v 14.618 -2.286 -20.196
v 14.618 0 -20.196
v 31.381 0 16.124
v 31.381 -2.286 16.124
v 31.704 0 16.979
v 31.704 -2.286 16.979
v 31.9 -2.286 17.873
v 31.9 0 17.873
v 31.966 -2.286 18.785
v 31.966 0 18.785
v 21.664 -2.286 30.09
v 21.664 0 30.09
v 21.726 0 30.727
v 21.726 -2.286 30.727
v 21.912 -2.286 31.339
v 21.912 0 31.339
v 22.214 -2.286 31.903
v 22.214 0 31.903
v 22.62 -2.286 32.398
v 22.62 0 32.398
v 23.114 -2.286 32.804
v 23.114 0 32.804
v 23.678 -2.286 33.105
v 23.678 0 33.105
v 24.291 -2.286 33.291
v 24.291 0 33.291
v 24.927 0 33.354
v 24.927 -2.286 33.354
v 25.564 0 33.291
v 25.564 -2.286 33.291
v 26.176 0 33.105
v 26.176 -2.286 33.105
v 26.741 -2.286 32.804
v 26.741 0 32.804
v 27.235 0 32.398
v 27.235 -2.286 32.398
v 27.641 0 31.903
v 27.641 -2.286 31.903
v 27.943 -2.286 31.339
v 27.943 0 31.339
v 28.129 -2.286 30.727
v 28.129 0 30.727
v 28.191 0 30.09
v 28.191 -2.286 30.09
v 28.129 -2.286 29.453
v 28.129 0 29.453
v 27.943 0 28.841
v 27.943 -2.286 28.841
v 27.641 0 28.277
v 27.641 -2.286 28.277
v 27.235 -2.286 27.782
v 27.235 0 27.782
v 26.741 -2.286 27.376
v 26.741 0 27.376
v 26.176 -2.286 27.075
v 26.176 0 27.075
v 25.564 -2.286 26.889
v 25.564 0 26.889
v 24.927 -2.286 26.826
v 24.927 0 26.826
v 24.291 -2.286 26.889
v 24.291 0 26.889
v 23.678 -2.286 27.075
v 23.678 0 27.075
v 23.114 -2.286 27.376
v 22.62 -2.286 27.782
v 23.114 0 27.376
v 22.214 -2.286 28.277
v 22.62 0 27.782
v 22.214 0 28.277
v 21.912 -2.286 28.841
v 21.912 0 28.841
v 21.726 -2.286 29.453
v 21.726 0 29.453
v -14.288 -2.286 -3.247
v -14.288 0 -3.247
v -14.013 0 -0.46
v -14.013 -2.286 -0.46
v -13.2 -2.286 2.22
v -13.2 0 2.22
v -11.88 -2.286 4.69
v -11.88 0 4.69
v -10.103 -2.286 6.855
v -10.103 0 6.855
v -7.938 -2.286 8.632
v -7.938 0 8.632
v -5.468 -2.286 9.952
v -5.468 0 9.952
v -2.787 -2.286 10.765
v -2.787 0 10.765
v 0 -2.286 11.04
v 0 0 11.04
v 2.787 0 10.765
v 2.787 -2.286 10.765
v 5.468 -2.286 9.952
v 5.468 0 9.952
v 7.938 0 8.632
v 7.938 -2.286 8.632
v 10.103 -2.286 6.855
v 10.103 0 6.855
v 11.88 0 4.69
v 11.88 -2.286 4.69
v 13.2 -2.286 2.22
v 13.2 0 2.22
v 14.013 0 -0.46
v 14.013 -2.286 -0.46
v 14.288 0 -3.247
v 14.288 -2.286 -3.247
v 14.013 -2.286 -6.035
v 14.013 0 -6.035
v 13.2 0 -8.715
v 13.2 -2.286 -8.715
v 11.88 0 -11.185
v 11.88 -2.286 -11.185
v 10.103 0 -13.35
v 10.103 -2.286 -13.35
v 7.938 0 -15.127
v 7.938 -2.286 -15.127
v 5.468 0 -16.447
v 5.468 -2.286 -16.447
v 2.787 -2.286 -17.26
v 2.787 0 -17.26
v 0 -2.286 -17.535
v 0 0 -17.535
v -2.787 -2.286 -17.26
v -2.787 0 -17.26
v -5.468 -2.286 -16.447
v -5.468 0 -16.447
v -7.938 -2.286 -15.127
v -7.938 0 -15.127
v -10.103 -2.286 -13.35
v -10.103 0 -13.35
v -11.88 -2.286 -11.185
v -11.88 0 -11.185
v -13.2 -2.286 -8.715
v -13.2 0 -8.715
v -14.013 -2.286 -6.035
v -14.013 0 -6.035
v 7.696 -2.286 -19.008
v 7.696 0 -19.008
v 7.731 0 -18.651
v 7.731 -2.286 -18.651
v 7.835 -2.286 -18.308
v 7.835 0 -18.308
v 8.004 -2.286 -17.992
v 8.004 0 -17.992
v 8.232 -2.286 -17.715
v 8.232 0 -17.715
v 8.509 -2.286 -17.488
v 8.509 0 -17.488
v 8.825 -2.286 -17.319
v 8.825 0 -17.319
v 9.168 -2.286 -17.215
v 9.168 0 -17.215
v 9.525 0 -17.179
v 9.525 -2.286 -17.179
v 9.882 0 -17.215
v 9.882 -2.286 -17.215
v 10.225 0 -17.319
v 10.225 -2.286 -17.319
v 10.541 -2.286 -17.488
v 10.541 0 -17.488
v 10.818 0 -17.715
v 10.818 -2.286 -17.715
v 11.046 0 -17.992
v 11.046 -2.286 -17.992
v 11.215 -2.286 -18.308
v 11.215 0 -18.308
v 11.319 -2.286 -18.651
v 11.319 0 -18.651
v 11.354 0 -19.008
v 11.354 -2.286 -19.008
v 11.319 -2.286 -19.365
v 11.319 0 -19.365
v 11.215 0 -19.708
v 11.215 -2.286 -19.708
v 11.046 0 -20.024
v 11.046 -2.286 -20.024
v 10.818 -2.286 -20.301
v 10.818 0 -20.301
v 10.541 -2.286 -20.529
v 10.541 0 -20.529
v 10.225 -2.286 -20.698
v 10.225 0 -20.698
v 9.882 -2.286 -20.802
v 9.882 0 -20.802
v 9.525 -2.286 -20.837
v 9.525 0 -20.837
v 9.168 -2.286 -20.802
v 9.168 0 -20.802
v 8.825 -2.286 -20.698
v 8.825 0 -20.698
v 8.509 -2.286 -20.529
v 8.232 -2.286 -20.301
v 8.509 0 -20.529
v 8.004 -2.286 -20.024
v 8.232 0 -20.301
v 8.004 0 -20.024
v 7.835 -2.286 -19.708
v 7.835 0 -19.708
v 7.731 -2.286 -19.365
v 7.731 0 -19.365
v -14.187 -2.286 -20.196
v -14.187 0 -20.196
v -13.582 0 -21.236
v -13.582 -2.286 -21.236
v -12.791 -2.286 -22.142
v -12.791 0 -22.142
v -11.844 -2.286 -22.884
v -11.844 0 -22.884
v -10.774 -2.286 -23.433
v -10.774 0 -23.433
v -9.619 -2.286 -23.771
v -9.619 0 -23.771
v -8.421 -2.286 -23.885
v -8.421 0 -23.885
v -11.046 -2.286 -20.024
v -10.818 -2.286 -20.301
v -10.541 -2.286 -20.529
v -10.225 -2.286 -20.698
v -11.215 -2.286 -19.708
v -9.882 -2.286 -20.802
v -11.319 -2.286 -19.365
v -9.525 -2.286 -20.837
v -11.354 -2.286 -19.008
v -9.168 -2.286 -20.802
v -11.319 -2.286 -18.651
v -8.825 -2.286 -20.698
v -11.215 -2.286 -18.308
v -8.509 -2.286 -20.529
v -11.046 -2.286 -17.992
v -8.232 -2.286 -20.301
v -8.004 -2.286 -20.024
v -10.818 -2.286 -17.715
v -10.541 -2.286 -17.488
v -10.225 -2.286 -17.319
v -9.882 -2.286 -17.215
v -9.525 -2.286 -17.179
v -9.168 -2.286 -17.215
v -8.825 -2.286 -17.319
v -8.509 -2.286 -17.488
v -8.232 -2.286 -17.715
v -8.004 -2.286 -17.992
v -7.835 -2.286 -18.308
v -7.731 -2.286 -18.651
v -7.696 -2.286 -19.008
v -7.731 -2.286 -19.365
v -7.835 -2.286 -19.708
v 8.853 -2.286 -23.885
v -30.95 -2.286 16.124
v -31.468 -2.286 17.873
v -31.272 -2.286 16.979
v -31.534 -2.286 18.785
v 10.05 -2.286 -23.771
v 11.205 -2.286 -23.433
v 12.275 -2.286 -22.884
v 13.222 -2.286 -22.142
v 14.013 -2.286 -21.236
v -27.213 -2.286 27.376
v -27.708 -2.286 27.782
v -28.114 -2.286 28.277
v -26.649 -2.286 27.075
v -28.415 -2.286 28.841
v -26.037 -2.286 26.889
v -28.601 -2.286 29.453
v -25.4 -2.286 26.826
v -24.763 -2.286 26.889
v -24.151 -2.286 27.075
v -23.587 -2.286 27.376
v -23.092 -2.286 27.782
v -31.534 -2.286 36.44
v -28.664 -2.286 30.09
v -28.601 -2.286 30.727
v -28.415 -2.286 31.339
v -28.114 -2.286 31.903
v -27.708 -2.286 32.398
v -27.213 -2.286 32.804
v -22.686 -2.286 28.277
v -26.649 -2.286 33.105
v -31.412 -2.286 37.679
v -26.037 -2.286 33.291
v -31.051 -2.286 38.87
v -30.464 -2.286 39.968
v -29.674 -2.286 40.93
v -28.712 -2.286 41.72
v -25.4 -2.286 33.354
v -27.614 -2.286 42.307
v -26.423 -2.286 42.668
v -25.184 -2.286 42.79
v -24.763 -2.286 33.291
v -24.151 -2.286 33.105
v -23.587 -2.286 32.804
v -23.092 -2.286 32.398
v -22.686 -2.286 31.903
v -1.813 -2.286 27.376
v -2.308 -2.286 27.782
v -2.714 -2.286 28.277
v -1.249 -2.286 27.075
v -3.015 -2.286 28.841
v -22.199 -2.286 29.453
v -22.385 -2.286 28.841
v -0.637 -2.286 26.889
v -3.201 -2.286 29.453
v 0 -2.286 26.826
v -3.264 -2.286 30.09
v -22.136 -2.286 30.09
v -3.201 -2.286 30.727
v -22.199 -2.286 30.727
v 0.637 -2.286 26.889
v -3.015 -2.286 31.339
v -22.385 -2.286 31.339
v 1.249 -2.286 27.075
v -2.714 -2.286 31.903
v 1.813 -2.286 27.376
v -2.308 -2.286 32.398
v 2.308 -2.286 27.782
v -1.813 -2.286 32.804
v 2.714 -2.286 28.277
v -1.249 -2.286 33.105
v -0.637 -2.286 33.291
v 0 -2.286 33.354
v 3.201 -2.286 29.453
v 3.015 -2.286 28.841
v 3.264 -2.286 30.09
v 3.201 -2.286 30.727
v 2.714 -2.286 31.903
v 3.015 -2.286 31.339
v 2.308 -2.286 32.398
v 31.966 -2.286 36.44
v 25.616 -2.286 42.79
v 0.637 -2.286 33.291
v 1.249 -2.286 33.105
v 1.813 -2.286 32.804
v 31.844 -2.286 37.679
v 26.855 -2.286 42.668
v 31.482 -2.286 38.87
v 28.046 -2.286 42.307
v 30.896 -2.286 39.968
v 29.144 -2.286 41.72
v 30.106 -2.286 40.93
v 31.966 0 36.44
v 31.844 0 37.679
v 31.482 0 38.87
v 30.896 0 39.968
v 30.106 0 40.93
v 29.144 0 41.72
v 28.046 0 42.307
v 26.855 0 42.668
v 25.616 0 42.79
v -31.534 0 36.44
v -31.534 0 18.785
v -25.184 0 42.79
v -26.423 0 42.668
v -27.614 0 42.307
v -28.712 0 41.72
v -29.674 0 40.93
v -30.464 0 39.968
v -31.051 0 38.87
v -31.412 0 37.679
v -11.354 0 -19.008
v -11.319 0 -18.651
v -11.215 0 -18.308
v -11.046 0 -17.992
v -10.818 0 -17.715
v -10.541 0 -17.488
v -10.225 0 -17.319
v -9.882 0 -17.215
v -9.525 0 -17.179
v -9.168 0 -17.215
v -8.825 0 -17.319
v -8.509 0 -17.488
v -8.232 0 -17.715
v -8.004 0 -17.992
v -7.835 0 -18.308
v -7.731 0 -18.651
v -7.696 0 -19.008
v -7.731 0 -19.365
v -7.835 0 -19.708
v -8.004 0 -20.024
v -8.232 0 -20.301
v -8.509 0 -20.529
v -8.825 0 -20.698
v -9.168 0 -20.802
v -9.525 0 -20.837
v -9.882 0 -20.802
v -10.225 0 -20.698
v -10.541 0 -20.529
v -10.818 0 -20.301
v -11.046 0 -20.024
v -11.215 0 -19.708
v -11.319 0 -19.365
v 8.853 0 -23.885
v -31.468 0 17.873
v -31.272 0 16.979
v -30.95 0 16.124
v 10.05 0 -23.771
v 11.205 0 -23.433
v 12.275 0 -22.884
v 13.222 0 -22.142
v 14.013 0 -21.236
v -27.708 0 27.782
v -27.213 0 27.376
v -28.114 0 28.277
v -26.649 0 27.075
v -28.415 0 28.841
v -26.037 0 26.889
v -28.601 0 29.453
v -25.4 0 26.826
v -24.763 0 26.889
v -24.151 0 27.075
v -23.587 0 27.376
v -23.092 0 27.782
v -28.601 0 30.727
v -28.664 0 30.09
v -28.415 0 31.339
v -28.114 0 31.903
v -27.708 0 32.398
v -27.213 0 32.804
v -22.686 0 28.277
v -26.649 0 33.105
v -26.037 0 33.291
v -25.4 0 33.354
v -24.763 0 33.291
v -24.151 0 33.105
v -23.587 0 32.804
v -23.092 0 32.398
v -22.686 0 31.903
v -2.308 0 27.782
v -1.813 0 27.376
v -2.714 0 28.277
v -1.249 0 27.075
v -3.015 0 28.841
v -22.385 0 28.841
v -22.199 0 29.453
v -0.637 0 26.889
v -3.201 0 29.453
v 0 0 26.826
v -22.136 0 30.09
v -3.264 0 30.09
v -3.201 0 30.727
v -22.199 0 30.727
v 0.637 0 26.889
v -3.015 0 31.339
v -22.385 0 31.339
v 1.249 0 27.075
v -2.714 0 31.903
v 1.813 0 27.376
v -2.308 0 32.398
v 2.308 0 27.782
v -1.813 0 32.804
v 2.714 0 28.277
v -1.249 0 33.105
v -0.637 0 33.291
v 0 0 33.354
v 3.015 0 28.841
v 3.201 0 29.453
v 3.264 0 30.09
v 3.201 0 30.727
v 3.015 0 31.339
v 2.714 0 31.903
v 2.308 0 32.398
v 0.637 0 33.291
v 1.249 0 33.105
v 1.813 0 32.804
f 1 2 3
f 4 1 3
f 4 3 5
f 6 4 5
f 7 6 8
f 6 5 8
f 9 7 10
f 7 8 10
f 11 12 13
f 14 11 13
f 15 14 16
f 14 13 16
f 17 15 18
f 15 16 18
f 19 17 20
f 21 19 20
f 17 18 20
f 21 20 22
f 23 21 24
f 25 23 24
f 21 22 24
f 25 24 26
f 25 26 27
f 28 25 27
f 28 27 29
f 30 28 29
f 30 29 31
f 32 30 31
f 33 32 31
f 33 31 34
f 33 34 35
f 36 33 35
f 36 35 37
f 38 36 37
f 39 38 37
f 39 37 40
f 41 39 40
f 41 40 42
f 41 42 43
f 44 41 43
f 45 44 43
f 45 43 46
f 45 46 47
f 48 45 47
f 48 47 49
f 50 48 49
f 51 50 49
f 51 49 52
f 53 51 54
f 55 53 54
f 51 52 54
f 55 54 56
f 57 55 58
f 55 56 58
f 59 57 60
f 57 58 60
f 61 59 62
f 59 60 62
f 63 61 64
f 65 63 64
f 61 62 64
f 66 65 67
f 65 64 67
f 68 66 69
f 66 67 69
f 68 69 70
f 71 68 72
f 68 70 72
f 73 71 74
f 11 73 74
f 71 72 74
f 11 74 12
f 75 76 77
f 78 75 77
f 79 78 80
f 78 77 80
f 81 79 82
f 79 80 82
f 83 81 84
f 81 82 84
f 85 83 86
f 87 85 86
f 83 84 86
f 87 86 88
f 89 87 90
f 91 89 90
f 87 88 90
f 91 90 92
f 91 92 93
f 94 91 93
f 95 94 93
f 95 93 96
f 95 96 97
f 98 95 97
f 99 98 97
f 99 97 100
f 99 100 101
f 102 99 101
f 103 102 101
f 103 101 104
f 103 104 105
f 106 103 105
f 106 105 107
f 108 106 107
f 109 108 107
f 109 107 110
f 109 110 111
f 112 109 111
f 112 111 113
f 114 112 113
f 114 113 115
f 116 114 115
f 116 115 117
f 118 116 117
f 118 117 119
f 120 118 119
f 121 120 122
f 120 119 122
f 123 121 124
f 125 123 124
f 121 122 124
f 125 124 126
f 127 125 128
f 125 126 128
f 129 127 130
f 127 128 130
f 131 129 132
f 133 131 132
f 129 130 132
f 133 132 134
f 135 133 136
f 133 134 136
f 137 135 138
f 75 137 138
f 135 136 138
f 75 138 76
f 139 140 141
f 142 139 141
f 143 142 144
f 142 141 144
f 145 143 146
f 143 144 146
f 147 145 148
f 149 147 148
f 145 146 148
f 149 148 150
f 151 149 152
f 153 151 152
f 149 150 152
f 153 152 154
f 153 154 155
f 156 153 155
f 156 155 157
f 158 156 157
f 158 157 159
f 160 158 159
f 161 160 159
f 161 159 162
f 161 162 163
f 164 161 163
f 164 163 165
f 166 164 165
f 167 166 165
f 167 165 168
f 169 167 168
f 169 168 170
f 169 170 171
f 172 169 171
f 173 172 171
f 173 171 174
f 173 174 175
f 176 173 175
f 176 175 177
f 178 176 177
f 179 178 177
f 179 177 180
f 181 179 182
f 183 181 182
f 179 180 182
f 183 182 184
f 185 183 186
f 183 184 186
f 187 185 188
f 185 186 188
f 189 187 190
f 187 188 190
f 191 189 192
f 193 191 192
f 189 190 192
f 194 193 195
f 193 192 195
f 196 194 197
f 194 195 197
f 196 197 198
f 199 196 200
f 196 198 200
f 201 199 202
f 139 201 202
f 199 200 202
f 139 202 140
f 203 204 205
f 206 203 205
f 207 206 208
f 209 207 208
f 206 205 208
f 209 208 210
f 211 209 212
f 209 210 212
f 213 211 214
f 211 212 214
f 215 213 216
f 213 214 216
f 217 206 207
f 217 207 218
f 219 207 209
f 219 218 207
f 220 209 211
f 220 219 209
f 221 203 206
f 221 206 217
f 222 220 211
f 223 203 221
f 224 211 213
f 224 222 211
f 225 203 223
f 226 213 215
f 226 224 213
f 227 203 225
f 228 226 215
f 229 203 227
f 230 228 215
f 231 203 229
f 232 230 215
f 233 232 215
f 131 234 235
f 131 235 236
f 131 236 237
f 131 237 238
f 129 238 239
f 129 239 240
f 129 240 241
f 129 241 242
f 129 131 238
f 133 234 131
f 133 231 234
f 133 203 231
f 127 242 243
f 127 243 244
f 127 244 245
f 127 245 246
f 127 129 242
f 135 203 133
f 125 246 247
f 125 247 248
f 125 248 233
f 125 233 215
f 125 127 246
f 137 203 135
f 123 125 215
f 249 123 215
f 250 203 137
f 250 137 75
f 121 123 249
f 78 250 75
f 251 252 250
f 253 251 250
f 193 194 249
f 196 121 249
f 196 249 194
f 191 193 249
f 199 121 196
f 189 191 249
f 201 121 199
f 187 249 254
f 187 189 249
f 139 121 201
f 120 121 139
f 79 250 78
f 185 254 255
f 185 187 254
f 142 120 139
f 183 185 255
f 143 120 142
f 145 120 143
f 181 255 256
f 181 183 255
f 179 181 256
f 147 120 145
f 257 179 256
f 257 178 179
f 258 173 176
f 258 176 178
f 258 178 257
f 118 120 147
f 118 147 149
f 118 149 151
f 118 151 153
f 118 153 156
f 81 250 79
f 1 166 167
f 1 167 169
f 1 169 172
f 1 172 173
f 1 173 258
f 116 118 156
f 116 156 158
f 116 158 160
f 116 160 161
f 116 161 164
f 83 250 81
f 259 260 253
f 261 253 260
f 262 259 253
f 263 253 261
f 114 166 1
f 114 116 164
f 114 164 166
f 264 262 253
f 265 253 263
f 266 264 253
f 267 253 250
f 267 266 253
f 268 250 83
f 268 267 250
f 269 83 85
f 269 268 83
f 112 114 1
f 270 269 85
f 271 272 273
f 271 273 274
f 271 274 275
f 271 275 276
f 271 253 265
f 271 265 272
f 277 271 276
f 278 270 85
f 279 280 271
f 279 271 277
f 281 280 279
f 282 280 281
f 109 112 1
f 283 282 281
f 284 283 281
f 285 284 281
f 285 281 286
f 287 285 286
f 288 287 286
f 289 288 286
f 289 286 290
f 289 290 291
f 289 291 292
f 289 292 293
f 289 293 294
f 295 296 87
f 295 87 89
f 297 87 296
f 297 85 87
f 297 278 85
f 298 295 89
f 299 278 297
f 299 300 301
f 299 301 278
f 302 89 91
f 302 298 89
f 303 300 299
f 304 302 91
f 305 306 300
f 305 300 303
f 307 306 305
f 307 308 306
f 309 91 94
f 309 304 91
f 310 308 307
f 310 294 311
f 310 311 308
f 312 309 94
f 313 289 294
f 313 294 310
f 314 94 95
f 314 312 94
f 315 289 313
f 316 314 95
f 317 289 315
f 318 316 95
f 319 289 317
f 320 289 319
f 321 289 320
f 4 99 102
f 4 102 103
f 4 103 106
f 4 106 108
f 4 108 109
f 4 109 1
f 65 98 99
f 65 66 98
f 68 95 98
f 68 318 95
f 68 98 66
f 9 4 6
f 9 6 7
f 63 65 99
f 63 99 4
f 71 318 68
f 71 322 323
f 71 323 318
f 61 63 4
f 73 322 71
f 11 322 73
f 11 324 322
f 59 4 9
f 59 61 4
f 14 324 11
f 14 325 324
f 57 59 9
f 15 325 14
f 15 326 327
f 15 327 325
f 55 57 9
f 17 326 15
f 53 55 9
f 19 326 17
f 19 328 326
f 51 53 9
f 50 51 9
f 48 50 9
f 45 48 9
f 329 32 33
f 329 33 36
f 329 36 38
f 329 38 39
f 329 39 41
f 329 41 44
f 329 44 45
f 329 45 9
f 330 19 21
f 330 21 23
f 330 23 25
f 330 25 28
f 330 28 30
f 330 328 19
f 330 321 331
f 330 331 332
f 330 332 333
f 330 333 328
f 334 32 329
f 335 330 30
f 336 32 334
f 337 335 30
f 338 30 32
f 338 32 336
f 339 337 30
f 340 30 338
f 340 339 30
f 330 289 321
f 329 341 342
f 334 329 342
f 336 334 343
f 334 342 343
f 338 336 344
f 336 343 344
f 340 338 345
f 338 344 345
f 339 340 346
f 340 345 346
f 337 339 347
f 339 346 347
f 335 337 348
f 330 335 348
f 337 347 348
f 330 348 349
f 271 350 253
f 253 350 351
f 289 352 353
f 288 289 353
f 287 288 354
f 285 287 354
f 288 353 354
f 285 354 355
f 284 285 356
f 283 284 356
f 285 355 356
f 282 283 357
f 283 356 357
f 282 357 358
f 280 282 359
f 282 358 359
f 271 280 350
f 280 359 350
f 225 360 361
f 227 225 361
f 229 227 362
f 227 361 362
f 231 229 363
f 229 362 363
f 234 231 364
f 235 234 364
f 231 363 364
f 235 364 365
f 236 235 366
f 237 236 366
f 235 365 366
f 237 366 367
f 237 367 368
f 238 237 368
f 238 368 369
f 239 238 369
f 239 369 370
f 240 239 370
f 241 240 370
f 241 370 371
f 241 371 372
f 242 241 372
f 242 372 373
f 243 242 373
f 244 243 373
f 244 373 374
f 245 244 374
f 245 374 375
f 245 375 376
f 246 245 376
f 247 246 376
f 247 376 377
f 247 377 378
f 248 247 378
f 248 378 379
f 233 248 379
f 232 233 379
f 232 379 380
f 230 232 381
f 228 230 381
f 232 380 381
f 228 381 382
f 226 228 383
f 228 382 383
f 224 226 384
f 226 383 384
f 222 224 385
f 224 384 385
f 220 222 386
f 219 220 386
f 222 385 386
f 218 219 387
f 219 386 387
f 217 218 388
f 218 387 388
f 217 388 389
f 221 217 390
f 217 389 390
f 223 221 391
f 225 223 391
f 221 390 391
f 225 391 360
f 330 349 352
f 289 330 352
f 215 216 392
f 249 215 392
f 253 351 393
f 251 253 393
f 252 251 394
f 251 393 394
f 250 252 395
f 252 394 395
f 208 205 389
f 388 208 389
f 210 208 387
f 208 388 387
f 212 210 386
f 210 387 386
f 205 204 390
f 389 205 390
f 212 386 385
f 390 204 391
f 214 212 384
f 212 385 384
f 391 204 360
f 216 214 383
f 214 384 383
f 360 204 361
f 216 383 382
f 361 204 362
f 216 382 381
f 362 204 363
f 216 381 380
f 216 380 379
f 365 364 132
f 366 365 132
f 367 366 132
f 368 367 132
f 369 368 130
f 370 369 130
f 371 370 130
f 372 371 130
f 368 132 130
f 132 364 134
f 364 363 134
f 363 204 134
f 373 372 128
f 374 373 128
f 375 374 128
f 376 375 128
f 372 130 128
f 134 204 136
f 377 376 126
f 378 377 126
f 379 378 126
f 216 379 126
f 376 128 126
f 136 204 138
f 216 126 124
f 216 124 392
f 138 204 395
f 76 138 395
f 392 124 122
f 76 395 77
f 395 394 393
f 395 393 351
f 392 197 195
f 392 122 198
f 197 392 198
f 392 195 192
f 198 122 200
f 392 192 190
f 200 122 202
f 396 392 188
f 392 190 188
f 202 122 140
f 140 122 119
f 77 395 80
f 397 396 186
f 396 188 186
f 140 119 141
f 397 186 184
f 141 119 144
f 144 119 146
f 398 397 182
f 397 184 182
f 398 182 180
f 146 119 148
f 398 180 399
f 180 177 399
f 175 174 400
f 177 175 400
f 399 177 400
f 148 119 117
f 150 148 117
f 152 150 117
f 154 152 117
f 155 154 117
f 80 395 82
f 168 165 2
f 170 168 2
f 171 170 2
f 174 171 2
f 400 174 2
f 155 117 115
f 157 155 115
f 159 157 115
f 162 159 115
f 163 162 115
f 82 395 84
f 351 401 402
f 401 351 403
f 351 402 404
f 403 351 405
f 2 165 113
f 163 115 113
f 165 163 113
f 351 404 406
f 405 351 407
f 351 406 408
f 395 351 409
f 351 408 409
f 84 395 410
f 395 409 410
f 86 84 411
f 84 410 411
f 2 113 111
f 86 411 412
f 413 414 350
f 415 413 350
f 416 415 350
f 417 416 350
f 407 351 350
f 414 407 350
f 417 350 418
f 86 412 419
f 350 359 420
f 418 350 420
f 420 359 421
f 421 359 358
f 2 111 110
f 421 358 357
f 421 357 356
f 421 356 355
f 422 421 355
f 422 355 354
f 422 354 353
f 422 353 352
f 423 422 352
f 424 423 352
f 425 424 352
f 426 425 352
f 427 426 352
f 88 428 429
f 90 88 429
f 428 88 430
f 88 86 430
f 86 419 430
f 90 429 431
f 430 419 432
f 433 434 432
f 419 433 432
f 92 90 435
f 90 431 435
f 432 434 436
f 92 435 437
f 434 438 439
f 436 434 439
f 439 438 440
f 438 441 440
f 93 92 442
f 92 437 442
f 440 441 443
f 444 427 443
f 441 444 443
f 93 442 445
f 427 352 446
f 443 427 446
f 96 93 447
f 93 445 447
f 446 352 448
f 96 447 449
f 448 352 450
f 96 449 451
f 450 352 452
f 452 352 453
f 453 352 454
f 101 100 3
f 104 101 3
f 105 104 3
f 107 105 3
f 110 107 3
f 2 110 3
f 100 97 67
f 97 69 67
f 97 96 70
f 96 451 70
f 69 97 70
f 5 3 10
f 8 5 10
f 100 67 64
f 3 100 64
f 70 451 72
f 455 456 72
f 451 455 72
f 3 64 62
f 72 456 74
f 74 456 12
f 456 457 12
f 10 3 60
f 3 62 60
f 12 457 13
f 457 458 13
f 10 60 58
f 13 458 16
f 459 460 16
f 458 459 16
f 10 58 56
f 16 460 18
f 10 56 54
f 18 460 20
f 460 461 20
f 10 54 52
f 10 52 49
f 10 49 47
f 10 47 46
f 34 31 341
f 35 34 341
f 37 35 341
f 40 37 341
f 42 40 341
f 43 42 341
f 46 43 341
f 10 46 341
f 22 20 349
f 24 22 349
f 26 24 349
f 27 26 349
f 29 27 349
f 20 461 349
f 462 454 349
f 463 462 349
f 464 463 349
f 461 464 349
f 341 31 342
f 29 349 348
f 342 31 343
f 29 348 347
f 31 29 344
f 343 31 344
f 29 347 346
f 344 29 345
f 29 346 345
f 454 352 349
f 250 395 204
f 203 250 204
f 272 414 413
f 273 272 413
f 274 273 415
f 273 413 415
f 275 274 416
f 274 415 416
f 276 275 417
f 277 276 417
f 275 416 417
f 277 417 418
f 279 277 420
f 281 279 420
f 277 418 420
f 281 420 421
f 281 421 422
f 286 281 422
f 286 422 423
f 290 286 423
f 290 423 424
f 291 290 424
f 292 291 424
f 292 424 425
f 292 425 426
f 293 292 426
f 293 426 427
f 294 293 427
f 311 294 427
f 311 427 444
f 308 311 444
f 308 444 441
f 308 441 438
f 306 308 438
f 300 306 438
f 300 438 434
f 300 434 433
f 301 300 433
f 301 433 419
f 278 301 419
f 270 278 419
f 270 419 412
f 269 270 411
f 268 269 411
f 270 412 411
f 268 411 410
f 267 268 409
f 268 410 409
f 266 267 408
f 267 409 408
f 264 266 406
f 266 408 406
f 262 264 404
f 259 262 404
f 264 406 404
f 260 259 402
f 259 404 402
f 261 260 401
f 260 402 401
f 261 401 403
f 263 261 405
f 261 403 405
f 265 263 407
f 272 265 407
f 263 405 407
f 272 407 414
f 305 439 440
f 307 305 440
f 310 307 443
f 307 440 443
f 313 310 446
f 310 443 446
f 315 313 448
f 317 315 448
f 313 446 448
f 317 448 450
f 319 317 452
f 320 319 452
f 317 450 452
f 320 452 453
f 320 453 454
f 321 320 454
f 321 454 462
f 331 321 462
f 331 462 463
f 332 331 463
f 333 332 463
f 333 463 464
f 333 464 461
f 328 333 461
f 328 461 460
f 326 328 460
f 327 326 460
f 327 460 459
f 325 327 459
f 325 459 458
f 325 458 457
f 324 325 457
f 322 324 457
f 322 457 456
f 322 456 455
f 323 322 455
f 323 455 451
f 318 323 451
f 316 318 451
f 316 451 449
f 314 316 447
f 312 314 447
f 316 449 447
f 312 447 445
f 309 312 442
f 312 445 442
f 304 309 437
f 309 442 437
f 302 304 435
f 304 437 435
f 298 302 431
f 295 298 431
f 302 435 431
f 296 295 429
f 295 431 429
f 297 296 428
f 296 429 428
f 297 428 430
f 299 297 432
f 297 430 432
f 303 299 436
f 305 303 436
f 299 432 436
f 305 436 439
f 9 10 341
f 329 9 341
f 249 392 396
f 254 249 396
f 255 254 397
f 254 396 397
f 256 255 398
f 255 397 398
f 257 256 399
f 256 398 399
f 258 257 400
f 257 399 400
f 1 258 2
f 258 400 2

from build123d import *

# Parameters (mm, degrees)
F1_DEPTH = 2.286
F3_D     = 6.5278
F5_D     = 28.575
F7_D     = 3.6576


with BuildPart() as f1:
    # F0 (on Front) → F1 (new body)
    with BuildSketch(Plane.XZ):
        with BuildLine():
            Line((25.6157214167, 42.7900233197), (-25.1842785833, 42.7900233197))
            ThreePointArc((-25.1842785833, 42.7900233197), (-29.6744066438, 40.9301513802), (-31.5342785833, 36.4400233197))
            Line((-31.5342785833, 36.4400233197), (-31.5342785833, 18.7847172783))
            ThreePointArc((-31.5342785833, 18.7847172783), (-31.3864432168, 17.422493413), (-30.9498206749, 16.1236978514))
            Line((-30.9498206749, 16.1236978514), (-14.1868850016, -20.1959961072))
            ThreePointArc((-14.1868850016, -20.1959961072), (-11.8436978478, -22.8838070833), (-8.4213429101, -23.8849766803))
            Line((-8.4213429101, -23.8849766803), (8.8527857435, -23.8849766803))
            ThreePointArc((8.8527857435, -23.8849766803), (12.2751406812, -22.8838070833), (14.6183278351, -20.1959961072))
            Line((14.6183278351, -20.1959961072), (31.3812635083, 16.1236978514))
            ThreePointArc((31.3812635083, 16.1236978514), (31.8178860502, 17.422493413), (31.9657214167, 18.7847172783))
            Line((31.9657214167, 18.7847172783), (31.9657214167, 36.4400233197))
            ThreePointArc((31.9657214167, 36.4400233197), (30.1058494773, 40.9301513802), (25.6157214167, 42.7900233197))
        make_face()
    extrude(amount=F1_DEPTH)

    # F3 (through all)
    with Locations(Plane.XZ.offset(2.286)):
        with Locations((-25.4, 30.0900233197), (0, 30.0900233197), (24.9274426514, 30.0900233197)):
            Hole(F3_D / 2)

    # F5 (through all)
    with Locations(Plane.XZ.offset(2.286)):
        with Locations((0, -3.2474766803)):
            Hole(F5_D / 2)

    # F7 (through all)
    with Locations(Plane.XZ.offset(2.286)):
        with Locations((-9.525, -19.0081766803), (9.525, -19.0081766803)):
            Hole(F7_D / 2)


solid = f1.part
